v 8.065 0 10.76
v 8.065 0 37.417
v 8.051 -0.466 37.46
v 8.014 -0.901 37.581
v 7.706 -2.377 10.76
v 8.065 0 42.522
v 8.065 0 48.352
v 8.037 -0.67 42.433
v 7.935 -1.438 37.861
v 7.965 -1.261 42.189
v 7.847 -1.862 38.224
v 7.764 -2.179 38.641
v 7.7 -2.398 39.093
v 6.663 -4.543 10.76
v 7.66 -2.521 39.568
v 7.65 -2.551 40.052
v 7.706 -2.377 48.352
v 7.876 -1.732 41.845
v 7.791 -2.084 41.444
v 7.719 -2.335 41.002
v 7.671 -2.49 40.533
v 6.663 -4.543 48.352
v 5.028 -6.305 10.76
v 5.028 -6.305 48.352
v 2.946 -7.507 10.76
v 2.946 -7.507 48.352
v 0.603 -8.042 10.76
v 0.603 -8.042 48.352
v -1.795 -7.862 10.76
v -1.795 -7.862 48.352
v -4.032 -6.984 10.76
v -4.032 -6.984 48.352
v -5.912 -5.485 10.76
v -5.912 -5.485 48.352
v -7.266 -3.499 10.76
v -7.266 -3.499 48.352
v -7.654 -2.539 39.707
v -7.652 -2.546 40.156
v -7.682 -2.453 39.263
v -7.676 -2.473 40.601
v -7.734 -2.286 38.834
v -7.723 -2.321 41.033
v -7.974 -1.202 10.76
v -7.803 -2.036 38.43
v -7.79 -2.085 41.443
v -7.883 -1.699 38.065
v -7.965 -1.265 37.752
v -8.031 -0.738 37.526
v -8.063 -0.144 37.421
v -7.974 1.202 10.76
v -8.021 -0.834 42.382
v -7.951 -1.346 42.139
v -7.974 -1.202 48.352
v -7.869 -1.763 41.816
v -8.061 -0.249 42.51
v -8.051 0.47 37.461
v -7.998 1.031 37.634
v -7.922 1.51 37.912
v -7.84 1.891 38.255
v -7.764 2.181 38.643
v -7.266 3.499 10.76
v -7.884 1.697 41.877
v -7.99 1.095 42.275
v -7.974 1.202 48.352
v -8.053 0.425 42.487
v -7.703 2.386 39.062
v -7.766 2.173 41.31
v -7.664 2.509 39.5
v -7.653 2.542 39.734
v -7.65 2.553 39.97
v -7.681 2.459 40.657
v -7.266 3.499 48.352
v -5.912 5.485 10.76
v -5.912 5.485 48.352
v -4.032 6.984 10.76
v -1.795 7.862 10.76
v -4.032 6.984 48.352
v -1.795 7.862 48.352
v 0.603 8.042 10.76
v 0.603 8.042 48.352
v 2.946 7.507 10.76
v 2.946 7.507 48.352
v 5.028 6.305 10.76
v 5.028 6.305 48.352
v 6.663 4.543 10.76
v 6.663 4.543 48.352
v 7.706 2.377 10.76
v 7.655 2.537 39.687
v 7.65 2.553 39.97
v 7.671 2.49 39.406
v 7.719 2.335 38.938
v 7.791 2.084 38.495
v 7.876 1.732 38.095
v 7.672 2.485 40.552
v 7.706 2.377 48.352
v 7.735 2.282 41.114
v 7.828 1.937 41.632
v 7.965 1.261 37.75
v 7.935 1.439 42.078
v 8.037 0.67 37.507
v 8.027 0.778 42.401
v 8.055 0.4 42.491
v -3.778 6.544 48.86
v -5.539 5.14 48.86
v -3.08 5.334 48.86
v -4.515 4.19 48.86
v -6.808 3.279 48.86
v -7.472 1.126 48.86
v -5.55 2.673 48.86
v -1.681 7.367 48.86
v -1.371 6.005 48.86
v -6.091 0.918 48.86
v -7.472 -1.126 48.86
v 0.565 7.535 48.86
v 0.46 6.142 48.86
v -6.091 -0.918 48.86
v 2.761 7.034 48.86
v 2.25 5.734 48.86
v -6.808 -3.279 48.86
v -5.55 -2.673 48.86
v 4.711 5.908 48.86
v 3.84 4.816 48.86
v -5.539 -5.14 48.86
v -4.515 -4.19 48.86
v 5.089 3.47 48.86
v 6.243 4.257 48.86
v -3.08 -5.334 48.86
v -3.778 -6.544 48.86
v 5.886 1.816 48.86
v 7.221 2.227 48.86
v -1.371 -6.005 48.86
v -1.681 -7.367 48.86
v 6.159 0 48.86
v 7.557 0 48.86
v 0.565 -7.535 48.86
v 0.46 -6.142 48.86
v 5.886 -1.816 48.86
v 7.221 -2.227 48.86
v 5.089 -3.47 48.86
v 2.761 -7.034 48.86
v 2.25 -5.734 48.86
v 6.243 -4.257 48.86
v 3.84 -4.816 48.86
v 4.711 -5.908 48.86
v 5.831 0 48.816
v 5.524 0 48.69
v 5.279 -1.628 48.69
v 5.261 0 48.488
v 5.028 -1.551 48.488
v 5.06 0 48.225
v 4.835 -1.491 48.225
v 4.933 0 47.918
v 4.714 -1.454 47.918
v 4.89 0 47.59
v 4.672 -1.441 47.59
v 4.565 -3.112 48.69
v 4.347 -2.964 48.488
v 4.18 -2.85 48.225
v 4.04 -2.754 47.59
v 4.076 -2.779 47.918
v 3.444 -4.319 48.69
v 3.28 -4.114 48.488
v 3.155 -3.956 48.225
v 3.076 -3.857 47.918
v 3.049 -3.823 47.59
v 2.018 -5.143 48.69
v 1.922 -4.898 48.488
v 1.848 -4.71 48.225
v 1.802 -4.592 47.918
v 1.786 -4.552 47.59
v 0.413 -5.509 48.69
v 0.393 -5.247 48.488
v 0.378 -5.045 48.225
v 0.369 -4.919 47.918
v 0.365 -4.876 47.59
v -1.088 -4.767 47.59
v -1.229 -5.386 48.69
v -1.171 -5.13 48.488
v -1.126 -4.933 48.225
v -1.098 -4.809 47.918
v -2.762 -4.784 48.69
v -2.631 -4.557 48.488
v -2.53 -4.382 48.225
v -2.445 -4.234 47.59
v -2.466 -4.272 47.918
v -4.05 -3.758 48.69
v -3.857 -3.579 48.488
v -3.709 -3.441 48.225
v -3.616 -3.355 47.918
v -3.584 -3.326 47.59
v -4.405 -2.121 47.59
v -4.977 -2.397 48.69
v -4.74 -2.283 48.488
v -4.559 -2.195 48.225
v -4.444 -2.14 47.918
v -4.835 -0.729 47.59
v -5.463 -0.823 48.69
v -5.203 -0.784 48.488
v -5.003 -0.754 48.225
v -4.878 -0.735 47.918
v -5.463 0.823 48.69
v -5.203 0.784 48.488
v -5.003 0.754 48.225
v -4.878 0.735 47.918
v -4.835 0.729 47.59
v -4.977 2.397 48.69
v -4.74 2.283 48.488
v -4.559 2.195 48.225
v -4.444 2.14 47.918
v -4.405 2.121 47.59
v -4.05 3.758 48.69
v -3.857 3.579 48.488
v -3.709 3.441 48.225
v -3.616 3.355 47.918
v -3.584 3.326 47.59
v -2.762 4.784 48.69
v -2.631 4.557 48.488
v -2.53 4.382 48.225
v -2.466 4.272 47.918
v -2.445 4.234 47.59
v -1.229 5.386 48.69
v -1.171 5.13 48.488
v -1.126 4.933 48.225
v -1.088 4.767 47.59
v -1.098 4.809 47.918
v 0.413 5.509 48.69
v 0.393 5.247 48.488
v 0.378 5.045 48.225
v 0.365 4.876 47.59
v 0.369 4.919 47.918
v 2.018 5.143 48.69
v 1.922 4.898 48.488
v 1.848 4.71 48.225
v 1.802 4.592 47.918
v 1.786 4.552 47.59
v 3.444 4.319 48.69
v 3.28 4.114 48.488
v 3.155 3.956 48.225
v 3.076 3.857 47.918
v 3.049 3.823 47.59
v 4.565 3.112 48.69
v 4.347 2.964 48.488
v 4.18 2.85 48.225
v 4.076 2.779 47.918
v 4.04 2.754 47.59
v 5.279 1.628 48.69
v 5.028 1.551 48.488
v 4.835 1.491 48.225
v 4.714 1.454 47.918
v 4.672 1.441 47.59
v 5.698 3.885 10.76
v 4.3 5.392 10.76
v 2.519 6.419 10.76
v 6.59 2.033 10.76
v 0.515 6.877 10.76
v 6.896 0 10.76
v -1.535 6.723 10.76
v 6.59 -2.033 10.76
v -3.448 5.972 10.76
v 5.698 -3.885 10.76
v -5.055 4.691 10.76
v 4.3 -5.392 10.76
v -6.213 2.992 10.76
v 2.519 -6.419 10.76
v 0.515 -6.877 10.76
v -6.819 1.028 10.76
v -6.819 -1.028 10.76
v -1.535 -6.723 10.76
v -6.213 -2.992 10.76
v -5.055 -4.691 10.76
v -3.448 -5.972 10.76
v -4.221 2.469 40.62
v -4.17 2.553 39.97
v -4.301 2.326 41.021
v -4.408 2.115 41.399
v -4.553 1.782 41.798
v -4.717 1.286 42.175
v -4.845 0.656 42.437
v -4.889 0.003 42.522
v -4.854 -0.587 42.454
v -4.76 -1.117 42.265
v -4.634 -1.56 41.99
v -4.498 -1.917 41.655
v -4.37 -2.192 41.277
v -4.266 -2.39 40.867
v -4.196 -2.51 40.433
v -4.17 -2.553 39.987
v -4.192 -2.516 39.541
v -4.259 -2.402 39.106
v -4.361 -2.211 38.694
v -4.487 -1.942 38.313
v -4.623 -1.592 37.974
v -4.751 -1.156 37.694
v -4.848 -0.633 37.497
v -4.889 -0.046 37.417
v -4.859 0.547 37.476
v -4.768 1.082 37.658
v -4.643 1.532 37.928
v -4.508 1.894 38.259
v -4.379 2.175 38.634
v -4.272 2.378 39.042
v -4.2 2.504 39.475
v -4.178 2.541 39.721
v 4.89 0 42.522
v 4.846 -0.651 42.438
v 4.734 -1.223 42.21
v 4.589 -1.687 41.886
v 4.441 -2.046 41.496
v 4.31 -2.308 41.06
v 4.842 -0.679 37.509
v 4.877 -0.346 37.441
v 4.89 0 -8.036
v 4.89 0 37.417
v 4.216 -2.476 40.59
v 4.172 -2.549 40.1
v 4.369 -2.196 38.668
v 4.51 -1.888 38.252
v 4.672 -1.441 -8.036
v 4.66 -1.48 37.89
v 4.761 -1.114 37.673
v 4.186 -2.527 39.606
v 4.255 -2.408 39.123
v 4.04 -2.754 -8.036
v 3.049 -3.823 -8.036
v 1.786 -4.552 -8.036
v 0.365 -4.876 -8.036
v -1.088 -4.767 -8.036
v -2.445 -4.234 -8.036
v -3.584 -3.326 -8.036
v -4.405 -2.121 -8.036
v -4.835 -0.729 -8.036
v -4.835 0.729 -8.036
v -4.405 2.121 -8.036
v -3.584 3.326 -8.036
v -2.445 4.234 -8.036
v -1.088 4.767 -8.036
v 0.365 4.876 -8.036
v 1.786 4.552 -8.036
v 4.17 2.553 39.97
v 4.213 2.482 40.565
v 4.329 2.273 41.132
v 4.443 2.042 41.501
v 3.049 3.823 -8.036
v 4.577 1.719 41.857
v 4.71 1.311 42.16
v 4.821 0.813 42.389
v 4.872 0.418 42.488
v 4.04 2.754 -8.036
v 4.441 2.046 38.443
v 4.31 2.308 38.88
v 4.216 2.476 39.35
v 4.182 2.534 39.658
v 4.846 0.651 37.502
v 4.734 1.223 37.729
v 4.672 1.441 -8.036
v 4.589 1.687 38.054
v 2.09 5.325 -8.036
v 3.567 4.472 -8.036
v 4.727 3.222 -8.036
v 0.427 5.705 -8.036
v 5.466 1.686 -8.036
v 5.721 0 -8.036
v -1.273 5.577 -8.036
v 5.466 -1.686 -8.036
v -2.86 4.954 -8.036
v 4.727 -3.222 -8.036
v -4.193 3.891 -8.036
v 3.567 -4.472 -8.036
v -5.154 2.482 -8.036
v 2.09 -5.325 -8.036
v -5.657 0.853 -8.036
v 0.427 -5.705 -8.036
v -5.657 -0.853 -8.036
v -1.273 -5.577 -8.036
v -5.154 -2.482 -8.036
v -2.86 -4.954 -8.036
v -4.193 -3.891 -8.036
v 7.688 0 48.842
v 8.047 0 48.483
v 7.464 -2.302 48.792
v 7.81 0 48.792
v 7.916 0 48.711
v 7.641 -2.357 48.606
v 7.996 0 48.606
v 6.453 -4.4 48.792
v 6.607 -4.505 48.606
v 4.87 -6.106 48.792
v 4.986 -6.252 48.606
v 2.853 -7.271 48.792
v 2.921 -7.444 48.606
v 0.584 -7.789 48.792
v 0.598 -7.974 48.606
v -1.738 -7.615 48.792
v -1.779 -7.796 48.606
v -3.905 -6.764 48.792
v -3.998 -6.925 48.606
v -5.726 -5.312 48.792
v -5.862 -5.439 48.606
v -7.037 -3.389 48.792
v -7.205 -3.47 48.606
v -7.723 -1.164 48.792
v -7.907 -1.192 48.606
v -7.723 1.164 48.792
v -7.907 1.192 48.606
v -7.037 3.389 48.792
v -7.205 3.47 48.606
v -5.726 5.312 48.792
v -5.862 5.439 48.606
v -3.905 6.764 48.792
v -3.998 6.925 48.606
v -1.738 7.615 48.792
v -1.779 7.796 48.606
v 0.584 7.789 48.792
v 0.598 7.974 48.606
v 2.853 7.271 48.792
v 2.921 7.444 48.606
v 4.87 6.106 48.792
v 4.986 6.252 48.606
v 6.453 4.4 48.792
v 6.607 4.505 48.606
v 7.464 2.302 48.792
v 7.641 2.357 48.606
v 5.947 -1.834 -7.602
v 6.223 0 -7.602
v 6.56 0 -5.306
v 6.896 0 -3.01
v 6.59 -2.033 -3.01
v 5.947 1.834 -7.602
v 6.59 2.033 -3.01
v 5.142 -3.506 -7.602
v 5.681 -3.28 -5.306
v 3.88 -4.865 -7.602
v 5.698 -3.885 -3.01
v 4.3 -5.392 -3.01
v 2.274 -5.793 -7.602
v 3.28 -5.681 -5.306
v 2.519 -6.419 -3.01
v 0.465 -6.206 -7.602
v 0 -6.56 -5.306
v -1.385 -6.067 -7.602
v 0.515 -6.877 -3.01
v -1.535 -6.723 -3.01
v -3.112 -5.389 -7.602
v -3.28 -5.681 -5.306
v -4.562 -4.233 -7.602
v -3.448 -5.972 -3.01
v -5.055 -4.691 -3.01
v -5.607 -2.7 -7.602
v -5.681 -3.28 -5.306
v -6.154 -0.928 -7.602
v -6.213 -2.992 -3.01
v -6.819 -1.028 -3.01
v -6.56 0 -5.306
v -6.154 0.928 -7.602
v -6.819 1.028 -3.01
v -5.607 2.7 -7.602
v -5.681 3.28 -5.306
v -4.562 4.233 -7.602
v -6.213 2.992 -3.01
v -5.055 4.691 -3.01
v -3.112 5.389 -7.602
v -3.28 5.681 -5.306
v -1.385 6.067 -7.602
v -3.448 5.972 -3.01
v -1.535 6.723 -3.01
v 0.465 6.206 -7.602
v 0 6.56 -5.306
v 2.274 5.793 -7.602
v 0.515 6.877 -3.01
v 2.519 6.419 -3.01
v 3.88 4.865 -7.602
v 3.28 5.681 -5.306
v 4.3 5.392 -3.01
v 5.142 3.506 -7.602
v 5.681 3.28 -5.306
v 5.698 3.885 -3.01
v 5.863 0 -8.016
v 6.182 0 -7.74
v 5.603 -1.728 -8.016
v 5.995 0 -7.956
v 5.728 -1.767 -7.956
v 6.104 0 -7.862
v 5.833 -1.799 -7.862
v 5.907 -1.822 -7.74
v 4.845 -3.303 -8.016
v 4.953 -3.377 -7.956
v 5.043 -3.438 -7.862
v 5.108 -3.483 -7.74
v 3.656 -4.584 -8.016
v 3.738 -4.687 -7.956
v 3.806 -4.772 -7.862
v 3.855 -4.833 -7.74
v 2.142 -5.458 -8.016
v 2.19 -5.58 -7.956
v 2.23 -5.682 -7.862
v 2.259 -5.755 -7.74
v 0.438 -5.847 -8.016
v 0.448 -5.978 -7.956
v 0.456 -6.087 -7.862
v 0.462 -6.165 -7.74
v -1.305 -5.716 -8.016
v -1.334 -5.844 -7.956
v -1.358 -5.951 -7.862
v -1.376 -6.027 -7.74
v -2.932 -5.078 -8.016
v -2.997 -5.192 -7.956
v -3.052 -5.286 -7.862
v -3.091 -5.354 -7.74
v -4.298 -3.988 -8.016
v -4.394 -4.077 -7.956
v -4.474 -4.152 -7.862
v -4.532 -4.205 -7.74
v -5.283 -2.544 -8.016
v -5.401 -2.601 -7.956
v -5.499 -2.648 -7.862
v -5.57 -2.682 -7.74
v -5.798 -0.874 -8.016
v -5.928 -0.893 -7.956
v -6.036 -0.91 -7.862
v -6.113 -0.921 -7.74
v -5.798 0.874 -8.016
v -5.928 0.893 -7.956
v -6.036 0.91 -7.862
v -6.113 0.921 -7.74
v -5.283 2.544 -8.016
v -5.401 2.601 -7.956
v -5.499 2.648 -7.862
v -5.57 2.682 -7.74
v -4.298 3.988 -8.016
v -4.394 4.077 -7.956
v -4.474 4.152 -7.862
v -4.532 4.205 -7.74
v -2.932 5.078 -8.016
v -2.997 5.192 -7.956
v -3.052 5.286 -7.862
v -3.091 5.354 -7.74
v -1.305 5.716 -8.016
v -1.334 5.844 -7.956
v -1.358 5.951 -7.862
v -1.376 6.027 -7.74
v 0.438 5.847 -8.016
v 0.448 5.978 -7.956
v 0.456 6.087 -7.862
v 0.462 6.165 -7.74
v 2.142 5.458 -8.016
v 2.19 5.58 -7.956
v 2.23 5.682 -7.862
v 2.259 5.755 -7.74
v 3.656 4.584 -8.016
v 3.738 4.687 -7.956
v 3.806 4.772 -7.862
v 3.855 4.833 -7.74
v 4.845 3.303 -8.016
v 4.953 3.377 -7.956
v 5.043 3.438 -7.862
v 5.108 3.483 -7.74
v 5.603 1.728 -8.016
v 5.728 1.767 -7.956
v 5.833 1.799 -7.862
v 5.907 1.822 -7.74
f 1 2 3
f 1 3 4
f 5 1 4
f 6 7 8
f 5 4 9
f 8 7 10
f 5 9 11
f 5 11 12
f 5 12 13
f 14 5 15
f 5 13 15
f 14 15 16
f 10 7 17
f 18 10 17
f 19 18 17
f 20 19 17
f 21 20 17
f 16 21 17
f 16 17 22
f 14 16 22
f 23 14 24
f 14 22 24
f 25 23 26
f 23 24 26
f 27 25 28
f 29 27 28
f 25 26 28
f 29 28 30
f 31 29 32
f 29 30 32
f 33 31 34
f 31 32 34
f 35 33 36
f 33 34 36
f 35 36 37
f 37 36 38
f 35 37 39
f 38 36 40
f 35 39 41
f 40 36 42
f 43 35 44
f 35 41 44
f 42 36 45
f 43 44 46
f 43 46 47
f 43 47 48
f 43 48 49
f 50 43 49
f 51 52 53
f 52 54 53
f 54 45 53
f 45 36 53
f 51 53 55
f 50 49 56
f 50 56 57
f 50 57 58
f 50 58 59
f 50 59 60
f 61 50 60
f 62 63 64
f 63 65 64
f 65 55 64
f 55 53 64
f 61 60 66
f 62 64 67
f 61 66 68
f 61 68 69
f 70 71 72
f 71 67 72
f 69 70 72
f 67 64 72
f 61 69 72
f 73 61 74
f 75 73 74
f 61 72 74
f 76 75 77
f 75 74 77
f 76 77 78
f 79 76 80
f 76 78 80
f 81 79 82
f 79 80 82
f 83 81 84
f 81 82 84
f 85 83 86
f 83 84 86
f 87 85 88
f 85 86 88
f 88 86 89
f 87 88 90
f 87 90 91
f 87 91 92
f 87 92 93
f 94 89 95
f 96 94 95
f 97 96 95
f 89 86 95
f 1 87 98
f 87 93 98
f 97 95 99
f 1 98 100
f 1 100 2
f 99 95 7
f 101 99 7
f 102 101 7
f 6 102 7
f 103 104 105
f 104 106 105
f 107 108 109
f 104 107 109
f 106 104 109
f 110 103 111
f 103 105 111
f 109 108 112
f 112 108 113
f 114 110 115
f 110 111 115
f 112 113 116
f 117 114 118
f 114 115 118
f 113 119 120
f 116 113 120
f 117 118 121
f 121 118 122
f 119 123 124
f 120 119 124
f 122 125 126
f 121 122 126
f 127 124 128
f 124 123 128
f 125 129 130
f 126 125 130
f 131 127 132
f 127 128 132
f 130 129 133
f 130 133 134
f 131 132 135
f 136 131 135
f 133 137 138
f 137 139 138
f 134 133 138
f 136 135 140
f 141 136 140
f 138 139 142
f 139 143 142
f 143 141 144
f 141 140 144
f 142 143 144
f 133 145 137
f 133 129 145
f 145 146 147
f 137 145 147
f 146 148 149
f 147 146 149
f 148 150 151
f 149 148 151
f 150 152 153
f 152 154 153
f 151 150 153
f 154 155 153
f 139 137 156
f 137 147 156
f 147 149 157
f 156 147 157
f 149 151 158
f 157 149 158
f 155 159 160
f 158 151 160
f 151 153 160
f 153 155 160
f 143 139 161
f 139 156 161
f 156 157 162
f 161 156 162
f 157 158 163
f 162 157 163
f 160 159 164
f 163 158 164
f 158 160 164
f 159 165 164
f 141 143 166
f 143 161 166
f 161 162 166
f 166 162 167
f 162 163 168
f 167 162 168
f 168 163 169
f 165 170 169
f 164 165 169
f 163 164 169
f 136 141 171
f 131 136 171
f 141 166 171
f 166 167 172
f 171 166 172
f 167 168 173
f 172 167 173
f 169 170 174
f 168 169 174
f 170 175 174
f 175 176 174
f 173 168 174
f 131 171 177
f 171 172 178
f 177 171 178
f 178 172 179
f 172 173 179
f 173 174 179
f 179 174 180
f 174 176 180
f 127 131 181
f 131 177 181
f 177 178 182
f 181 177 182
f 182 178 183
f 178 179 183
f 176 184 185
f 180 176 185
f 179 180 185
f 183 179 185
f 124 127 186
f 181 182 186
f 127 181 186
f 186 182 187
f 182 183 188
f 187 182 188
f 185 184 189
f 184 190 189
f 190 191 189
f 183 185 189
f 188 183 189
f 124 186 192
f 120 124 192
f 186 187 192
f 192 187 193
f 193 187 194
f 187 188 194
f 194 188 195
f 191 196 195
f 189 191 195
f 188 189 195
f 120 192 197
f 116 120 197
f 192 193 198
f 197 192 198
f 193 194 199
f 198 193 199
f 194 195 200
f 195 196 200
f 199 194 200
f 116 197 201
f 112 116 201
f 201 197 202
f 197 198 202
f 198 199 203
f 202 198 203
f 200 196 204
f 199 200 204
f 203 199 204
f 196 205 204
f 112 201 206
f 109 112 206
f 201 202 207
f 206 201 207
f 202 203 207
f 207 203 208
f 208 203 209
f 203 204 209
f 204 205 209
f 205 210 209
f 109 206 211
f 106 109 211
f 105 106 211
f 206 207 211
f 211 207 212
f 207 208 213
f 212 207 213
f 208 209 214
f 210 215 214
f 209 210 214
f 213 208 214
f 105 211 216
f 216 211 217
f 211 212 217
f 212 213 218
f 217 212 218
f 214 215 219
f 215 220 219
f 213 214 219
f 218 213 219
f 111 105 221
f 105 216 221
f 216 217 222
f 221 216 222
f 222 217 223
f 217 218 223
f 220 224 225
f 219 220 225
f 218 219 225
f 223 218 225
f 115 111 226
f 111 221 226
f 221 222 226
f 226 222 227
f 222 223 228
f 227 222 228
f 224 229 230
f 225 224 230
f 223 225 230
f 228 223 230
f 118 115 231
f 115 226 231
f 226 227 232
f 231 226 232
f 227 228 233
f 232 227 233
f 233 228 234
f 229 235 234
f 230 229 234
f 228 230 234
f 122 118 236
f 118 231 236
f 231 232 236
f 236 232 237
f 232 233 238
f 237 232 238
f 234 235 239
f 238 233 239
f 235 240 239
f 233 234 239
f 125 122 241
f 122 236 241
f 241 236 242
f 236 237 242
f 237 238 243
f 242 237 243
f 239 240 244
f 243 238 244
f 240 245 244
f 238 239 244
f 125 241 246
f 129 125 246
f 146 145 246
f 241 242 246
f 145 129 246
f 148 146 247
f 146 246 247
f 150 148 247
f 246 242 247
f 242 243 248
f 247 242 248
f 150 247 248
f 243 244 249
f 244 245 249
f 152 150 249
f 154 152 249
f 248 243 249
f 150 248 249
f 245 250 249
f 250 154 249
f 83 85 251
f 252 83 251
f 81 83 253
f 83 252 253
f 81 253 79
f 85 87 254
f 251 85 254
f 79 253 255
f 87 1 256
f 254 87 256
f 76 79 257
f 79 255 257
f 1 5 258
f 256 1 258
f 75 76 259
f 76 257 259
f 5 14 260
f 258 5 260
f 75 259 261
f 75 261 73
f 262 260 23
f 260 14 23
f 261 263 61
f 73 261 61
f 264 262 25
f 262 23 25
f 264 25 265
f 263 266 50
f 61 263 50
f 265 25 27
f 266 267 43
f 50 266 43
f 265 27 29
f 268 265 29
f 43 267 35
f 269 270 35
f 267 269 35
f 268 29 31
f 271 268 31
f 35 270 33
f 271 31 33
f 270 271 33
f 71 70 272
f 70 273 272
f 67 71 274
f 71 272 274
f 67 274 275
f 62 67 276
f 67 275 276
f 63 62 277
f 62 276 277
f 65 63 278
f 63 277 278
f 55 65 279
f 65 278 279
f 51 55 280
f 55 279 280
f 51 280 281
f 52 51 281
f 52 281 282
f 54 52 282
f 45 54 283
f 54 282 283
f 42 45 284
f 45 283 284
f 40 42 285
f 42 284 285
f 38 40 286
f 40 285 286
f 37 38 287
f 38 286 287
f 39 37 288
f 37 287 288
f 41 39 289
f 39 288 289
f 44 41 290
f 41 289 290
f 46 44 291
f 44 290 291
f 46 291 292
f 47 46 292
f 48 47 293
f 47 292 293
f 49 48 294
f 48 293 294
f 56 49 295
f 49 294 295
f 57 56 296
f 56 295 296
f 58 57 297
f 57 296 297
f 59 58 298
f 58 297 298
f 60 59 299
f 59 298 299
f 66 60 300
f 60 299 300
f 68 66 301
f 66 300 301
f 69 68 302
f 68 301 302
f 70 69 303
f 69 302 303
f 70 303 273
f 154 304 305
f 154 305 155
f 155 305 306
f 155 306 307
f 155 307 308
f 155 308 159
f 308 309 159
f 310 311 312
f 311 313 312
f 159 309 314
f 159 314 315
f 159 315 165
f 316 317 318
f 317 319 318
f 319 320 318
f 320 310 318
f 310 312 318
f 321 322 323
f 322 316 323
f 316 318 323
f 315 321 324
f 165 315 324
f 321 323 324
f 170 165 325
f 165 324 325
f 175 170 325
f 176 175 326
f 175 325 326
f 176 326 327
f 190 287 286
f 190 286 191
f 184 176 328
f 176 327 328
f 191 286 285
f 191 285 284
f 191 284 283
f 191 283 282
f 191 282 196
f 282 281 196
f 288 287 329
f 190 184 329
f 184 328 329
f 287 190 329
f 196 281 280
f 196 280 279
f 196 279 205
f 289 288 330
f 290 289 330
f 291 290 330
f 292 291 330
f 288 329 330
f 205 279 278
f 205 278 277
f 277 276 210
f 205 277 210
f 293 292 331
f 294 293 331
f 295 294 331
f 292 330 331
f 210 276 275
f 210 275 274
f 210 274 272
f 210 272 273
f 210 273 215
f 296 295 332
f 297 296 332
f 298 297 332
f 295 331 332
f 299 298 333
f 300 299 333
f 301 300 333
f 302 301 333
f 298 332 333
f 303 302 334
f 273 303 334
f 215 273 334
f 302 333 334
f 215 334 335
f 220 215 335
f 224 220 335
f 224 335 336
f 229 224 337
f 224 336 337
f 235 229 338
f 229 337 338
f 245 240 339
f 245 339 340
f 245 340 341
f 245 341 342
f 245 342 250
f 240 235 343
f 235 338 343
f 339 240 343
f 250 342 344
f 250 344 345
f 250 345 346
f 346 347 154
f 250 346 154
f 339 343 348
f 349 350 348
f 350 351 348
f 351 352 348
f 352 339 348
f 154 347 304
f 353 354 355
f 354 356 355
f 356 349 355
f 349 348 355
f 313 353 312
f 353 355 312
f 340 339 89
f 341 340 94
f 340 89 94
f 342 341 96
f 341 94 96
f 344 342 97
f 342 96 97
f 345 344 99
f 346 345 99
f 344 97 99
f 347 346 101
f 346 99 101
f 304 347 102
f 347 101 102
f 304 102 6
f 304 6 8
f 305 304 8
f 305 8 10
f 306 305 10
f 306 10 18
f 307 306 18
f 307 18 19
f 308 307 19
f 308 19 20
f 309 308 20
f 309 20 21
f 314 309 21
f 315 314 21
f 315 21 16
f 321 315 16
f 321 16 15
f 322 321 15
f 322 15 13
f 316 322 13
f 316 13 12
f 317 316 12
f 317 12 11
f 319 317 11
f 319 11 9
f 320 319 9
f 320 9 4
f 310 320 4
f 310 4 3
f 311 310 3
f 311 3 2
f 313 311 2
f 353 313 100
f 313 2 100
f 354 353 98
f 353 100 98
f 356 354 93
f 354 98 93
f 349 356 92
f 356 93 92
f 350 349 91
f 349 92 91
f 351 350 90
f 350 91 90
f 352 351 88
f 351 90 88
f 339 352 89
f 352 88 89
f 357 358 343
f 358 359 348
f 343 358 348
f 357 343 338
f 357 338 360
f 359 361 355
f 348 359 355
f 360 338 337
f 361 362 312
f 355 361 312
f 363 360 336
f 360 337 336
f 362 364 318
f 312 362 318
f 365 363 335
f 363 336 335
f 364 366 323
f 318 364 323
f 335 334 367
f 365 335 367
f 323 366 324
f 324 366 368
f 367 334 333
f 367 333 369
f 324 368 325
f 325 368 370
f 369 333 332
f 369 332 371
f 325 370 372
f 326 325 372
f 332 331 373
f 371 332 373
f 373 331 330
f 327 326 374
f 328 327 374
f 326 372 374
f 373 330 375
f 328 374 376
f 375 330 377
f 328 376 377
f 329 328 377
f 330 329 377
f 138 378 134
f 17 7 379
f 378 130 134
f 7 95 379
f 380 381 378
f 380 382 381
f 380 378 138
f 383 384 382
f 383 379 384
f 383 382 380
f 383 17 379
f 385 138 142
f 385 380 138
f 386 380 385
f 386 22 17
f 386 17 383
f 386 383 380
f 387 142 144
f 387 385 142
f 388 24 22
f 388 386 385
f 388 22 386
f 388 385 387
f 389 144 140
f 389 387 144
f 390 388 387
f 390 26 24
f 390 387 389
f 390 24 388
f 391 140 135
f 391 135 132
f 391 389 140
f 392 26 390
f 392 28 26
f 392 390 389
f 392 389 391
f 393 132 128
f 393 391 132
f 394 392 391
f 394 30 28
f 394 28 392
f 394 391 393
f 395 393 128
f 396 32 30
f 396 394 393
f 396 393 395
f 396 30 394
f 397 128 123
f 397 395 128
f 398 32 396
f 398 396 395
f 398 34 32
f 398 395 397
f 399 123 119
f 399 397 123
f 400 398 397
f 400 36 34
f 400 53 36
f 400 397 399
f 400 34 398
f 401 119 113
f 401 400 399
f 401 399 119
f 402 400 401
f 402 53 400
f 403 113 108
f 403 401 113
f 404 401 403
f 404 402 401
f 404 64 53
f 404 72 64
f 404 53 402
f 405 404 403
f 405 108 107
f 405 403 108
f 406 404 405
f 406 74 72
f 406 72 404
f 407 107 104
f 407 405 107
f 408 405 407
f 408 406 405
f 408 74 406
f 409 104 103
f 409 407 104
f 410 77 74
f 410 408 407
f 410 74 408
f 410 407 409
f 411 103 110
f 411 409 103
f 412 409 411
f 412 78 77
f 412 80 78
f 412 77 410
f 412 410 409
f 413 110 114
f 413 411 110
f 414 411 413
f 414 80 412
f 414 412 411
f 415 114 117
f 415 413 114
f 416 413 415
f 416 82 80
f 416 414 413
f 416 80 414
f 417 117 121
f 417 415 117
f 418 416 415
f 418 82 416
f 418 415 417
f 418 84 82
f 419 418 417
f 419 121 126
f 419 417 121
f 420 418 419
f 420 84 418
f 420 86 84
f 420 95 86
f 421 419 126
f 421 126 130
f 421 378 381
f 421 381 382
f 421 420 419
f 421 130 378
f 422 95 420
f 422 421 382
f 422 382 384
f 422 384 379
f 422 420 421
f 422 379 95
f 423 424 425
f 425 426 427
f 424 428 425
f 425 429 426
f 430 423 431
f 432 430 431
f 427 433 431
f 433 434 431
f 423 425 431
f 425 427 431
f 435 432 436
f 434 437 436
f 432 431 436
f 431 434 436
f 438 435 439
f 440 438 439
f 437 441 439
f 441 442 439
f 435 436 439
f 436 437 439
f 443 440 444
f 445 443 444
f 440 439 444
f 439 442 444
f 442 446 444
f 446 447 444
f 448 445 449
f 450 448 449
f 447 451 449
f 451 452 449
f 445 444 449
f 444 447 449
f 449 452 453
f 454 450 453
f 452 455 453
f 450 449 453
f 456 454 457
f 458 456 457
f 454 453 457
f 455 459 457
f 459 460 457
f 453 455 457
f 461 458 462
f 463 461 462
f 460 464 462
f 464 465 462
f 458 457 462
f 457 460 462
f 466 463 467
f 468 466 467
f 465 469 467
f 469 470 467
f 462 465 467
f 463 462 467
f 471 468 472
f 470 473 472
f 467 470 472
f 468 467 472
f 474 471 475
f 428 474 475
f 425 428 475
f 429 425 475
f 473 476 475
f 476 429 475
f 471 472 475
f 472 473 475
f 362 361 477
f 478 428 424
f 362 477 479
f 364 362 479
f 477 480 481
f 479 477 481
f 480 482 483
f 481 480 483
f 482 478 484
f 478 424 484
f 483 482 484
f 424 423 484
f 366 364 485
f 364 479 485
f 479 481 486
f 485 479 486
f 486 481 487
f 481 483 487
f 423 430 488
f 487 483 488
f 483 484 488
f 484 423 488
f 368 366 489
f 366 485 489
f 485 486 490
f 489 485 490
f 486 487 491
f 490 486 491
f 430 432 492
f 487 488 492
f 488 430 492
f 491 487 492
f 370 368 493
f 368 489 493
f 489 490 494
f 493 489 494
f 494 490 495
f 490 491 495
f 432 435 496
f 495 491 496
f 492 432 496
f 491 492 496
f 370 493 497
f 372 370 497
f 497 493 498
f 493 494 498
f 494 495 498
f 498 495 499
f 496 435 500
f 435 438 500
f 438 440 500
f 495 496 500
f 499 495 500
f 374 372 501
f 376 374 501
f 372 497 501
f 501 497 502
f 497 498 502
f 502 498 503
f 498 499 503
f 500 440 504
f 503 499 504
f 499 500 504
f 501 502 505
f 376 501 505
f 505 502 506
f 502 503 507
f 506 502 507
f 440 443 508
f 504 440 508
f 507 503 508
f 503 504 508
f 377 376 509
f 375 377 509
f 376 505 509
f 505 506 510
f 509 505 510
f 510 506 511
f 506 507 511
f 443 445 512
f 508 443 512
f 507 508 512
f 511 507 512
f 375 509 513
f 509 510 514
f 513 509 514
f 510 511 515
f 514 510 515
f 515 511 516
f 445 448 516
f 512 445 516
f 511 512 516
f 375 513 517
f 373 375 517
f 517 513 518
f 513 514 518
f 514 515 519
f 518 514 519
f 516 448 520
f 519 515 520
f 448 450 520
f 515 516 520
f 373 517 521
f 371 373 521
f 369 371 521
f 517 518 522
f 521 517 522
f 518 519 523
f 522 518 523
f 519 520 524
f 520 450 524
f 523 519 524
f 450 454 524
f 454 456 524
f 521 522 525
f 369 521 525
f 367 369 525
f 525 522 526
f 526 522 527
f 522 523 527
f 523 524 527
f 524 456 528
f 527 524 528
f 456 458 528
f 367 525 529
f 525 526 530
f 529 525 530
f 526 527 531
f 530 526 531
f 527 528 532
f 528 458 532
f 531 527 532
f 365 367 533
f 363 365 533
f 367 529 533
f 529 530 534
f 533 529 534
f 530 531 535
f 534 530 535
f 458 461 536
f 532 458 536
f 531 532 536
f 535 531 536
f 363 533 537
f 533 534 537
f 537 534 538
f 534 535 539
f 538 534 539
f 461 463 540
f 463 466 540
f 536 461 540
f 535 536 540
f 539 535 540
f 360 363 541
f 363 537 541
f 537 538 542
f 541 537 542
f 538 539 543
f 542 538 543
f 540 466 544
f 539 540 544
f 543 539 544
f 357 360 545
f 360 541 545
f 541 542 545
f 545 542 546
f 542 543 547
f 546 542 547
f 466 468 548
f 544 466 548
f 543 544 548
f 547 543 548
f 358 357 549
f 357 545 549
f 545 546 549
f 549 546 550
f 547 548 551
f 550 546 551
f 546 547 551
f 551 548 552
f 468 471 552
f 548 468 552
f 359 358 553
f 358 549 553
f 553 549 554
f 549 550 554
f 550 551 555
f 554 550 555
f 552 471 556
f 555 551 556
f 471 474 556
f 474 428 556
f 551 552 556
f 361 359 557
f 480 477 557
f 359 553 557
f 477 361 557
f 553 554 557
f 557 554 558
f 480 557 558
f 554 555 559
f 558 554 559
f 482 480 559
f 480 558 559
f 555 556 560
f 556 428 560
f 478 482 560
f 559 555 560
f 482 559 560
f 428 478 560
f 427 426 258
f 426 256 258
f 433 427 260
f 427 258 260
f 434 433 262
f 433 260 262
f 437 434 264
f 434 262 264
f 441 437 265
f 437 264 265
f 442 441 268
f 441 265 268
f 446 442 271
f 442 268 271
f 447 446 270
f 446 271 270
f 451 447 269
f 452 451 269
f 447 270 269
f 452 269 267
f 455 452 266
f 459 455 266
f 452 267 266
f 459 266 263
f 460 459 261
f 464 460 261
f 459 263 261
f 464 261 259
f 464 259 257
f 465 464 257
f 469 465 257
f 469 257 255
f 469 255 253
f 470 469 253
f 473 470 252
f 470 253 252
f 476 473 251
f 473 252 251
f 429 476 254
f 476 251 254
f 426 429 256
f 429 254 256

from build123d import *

# Parameters (mm, degrees)
F2_R     = 1.27
F3_R     = 0.508
F4_R     = 2.5527
F5_DEPTH = 12.7
F6_R     = 0.508


with BuildPart() as f1:
    # F0 (on Front) → F1 (revolve)
    with BuildSketch(Plane.XZ):
        Polygon((6.1595, -8.036257), (6.8961, -3.009944), (6.8961, 10.759743), (8.0645, 10.759743), (8.0645, 48.859743), (4.8895, 48.859743), (4.8895, -8.036257), align=None)
    revolve(axis=Axis((0, 0, 17.241214), (0, 0, -1)))

    # F2
    f2_edges = [f1.edges().sort_by_distance(p)[0] for p in [
        (-4.8895, 0, 48.859743),
    ]]
    fillet(f2_edges, radius=F2_R)

    # F3
    f3_edges = [f1.edges().sort_by_distance(p)[0] for p in [
        (-8.0645, 0, 48.859743),
    ]]
    fillet(f3_edges, radius=F3_R)

    # F4 (on Right) → F5 (cut, symmetric)
    with BuildSketch(Plane.YZ):
        with Locations((0, 39.969743)):
            Circle(F4_R)
    extrude(amount=F5_DEPTH, both=True, mode=Mode.SUBTRACT)

    # F6
    f6_edges = [f1.edges().sort_by_distance(p)[0] for p in [
        (-6.1595, 0, -8.036257),
    ]]
    fillet(f6_edges, radius=F6_R)


solid = f1.part
